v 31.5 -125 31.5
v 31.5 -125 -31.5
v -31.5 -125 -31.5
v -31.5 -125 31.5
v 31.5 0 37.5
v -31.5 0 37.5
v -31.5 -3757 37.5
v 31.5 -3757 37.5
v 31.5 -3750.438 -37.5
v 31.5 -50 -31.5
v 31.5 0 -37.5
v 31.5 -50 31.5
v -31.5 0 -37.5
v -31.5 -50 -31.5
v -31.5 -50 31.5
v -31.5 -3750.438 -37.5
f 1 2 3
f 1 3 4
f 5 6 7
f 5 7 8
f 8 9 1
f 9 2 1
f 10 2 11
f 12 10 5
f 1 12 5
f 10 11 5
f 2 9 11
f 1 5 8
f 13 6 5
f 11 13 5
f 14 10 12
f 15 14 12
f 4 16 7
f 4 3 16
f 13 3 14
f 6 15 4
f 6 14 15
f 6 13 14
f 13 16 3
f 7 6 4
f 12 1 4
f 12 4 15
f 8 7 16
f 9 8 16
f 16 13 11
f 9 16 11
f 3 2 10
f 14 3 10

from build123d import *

# Parameters (mm, degrees)
F0_W     = 63
F0_H     = 75
F1_DEPTH = 3757
F3_DEPTH = 63.001
F4_W     = 75
F4_H     = 63
F5_DEPTH = 63.001


with BuildPart() as f1:
    # F0 (on Front) → F1 (new body)
    with BuildSketch(Plane.XZ):
        Rectangle(F0_W, F0_H)
    extrude(amount=F1_DEPTH)

    # F2 (on face) → F3 (cut, through all)
    with BuildSketch(Plane(origin=(-31.5, 0, 0), x_dir=(0, -1, 0), z_dir=(-1, 0, 0))):
        Polygon((3757, -37.5), (3757, 37.5), (3750.43835, -37.5), align=None)
    extrude(amount=-F3_DEPTH, mode=Mode.SUBTRACT)

    # F4 (on face) → F5 (cut, through all)
    with BuildSketch(Plane.YZ.offset(31.5)):
        with Locations((-87.5, 0)):
            Rectangle(F4_W, F4_H)
    extrude(amount=-F5_DEPTH, mode=Mode.SUBTRACT)


solid = f1.part
